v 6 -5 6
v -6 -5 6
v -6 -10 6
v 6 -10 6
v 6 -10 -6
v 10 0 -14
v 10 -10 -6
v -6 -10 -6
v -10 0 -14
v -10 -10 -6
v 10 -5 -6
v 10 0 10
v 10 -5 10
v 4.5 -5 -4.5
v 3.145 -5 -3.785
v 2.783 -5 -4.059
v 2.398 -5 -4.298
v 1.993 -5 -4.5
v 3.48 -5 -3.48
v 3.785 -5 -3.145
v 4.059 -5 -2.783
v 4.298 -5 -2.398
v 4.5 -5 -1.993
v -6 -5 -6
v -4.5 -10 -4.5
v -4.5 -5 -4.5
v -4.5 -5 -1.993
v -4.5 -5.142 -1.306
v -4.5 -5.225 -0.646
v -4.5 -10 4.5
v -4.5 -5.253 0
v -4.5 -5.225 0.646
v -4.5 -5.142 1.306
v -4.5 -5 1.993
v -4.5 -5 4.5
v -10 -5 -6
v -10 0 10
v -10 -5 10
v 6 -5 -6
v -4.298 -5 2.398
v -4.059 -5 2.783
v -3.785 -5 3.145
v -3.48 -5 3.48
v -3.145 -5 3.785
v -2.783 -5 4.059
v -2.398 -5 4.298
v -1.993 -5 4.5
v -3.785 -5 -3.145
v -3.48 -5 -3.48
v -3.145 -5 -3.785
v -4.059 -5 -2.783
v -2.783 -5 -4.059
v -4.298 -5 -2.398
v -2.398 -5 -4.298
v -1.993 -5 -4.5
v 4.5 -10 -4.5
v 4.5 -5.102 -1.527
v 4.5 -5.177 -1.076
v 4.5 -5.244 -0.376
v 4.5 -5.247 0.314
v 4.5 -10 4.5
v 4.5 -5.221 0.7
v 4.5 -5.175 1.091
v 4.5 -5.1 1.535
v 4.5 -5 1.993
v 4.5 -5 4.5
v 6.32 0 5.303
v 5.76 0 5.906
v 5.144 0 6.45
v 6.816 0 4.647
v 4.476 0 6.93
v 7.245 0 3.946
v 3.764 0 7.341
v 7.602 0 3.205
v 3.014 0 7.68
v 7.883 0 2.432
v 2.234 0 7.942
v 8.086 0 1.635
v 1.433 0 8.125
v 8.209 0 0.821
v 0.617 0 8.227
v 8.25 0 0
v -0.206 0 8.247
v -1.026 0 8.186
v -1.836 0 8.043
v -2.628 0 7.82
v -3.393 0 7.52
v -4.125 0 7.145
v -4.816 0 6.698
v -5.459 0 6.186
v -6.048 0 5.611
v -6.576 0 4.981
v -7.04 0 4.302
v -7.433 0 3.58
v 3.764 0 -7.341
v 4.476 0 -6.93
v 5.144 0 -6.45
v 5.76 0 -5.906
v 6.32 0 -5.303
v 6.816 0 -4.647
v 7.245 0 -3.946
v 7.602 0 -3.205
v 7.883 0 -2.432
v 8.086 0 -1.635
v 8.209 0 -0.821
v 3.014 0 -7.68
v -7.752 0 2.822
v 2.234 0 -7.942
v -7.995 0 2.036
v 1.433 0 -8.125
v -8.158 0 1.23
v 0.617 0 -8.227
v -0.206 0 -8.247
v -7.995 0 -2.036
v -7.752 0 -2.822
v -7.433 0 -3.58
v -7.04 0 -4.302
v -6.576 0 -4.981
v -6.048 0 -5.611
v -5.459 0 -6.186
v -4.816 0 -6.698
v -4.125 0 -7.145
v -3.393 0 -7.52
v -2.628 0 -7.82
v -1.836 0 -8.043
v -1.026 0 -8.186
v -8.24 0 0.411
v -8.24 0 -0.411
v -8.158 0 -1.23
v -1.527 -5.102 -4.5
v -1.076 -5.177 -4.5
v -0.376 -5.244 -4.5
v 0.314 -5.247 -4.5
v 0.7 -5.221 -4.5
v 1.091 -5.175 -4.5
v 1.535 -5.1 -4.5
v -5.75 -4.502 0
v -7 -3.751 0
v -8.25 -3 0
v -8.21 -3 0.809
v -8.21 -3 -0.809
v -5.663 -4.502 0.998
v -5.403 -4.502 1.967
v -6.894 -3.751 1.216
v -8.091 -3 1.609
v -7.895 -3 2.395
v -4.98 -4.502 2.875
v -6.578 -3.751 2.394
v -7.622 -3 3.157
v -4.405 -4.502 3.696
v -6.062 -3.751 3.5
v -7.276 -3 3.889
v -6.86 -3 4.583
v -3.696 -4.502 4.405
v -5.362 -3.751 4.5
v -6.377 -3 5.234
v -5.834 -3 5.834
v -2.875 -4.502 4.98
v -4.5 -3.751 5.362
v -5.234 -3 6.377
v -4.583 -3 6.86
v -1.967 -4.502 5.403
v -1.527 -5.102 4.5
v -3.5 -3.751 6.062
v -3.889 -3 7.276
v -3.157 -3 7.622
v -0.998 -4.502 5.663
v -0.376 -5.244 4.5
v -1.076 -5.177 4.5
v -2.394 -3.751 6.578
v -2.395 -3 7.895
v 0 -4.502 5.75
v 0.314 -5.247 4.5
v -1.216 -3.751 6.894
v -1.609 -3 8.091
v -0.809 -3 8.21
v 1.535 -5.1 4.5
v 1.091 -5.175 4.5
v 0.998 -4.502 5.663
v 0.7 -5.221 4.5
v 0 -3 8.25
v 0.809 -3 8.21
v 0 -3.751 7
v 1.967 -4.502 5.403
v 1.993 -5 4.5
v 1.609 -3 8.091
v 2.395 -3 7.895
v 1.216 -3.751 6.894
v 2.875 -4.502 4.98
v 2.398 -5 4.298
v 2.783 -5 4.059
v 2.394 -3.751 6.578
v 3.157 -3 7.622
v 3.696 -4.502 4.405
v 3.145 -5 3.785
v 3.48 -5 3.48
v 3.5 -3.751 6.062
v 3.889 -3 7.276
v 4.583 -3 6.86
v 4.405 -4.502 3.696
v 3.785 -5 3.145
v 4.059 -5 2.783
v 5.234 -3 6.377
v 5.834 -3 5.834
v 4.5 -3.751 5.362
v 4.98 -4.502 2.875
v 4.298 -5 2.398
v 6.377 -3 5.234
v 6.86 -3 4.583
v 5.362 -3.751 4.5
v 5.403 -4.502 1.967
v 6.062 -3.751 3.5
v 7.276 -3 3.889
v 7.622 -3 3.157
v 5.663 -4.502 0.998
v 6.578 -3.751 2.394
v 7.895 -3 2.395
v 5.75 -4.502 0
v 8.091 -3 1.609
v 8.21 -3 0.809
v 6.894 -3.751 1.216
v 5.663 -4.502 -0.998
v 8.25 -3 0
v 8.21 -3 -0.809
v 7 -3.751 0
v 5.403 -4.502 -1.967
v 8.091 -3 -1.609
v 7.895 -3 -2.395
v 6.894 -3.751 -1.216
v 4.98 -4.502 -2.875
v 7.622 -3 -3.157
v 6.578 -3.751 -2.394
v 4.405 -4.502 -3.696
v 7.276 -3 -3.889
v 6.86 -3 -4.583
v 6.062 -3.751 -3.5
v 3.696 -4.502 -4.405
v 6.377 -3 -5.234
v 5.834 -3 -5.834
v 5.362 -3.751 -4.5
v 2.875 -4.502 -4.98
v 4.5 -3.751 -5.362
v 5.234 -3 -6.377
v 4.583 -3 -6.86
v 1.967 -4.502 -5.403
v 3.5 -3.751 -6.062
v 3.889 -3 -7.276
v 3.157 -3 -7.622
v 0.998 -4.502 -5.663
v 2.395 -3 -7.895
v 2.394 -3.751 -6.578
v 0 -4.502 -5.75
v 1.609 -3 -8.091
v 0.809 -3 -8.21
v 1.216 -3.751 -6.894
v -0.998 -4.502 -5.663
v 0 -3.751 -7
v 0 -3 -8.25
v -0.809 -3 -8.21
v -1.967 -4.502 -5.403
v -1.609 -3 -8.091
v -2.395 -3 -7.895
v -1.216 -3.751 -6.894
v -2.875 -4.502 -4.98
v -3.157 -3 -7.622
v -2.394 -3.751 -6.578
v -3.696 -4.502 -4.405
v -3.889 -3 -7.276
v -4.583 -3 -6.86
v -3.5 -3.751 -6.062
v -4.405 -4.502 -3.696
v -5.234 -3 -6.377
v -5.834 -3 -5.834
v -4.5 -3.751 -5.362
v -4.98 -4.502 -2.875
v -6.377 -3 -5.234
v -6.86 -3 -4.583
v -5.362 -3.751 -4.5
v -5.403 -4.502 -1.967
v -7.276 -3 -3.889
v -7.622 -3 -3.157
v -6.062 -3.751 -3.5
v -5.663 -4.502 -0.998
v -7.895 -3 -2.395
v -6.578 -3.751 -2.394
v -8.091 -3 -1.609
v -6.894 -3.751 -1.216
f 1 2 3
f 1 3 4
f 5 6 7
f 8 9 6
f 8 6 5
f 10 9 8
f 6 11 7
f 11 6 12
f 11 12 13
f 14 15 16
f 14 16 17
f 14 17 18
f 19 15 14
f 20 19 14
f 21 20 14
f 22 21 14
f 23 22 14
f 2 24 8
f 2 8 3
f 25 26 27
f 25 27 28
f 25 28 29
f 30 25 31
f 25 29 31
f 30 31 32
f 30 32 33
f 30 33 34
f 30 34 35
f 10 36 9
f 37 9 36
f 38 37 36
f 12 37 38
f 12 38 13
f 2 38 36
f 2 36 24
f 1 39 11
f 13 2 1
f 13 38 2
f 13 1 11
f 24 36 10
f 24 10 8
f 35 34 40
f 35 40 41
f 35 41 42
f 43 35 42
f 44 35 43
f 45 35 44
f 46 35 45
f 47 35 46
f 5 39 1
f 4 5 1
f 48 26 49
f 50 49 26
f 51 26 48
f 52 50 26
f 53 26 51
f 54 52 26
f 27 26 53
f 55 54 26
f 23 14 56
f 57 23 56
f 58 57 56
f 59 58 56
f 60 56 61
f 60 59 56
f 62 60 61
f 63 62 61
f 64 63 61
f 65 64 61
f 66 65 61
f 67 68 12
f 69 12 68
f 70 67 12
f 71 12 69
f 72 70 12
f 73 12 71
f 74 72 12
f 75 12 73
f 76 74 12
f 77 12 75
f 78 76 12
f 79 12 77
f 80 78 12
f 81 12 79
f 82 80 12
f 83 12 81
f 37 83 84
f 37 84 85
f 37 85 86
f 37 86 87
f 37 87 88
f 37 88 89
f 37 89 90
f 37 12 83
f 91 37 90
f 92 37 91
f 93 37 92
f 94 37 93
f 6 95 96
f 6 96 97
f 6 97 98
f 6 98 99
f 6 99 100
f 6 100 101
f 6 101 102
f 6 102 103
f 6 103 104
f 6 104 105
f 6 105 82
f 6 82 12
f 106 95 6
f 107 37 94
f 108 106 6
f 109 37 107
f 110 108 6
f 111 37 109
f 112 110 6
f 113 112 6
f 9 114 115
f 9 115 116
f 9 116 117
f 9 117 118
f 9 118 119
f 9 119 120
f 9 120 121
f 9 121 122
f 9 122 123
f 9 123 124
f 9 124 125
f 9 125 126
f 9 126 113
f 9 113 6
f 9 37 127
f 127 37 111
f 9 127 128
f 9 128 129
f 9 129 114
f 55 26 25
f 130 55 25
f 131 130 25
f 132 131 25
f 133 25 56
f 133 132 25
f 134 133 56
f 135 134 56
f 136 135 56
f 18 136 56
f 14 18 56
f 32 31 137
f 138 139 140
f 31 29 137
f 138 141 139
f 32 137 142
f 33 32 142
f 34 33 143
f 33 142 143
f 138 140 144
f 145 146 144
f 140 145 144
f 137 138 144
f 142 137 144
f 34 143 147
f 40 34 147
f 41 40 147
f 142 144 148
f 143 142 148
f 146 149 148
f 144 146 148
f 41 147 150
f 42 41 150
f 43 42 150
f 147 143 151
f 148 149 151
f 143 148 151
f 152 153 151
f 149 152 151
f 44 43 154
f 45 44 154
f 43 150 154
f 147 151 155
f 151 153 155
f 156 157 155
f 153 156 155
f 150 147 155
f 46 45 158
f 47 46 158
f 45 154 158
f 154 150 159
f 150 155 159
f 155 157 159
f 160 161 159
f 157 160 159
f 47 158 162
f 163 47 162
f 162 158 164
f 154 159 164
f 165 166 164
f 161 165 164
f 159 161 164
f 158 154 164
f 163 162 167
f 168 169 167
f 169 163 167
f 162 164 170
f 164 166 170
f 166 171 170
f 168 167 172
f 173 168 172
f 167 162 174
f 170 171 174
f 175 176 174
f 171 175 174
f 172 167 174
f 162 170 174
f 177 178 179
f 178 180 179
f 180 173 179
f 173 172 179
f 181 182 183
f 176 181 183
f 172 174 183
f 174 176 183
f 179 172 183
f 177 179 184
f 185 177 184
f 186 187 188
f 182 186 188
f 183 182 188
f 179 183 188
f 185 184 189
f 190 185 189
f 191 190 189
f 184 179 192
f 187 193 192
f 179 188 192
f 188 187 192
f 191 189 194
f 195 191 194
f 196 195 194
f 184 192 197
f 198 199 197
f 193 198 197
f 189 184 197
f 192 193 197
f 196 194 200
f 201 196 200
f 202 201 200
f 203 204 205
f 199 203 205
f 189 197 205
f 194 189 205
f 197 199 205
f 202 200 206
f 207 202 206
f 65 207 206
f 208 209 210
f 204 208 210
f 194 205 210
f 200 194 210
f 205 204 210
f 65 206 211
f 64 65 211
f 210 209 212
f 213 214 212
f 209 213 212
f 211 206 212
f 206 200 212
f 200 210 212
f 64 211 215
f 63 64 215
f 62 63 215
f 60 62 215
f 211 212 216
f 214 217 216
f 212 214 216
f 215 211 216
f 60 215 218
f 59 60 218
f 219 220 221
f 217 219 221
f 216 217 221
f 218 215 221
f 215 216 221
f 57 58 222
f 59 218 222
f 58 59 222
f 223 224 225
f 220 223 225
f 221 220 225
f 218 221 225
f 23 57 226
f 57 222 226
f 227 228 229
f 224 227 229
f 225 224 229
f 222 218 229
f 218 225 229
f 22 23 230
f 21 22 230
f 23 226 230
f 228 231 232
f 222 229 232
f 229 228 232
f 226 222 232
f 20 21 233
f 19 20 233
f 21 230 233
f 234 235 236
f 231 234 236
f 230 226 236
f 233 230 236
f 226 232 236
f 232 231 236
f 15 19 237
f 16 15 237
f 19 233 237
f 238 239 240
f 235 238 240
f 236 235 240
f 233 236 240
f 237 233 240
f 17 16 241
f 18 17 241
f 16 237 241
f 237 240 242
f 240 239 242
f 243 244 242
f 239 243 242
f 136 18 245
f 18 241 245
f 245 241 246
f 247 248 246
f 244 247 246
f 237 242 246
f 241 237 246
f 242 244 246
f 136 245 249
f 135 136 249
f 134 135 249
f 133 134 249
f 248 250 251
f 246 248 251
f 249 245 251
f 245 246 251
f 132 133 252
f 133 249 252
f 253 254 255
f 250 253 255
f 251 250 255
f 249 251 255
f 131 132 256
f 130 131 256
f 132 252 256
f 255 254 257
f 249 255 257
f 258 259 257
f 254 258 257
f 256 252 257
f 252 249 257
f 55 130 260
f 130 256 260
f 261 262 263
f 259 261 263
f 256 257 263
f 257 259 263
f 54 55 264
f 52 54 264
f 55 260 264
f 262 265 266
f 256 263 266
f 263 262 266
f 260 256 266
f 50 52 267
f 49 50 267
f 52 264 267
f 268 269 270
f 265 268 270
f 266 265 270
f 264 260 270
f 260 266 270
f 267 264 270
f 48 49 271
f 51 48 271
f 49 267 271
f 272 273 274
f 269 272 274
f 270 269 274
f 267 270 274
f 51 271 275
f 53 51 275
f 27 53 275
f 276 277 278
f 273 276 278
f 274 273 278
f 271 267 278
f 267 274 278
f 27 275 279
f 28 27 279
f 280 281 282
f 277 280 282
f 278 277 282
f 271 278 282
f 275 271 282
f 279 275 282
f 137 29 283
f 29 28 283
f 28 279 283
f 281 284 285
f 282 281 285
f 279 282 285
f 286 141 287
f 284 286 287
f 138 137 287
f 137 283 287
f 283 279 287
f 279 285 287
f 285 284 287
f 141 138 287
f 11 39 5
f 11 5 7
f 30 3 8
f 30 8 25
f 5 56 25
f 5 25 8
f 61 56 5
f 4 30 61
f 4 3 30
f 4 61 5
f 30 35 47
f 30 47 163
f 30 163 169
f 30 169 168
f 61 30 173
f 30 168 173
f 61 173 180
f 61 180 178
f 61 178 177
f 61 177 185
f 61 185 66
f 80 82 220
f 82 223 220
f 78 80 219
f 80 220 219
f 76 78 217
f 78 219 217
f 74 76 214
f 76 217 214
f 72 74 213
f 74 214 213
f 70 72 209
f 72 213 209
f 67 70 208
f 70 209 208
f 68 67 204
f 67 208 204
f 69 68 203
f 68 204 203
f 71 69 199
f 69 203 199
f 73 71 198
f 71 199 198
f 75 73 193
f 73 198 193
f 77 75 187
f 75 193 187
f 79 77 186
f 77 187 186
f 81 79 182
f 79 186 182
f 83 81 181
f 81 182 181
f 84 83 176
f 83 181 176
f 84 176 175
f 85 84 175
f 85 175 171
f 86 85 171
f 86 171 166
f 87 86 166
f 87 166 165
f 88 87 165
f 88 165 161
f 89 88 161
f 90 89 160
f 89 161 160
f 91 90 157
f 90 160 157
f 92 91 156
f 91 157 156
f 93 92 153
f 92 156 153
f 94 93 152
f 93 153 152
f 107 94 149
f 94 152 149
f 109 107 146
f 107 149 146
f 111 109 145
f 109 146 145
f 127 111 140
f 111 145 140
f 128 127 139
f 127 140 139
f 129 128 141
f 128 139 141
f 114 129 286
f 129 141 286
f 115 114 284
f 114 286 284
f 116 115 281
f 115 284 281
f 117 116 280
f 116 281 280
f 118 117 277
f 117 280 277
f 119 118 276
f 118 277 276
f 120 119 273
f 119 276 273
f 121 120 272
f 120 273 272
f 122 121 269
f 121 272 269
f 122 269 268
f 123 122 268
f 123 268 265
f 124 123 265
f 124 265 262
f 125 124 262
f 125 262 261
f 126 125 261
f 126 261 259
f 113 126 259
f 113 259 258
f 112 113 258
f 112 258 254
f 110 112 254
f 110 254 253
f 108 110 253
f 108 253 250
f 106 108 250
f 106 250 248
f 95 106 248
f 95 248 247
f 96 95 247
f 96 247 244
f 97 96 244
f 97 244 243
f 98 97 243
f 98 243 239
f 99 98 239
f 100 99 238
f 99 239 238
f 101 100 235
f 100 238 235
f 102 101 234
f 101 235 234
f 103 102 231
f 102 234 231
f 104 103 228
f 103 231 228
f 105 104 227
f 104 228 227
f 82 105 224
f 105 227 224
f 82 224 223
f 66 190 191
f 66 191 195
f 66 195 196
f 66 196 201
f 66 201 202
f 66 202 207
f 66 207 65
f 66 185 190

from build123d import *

# Parameters (mm, degrees)
F0_W      = 20
F0_H      = 20
F1_DEPTH  = 5
F2_W      = 12
F2_H      = 12
F2_W_2    = 9
F2_H_2    = 9
F3_DEPTH  = 5
F5_D      = 16.5
F5_DEPTH  = 3
F5_TIP    = 4.957100107
F6_W      = 20
F6_H      = 4
F7_DEPTH  = 5
F9_DEPTH  = 20.001
F11_DEPTH = 20


with BuildPart() as f1:
    # F0 (on Front) → F1 (new body)
    with BuildSketch(Plane.XZ):
        Rectangle(F0_W, F0_H)
    extrude(amount=F1_DEPTH)

    # F2 (on face) → F3 (join)
    with BuildSketch(Plane.XZ.offset(5)):
        Rectangle(F2_W, F2_H)
        Rectangle(F2_W_2, F2_H_2, mode=Mode.SUBTRACT)
    extrude(amount=F3_DEPTH)

    # F5
    with Locations(Plane(origin=(0, 0, 0), x_dir=(-1, 0, 0), z_dir=(0, 1, 0))):
        with Locations((0, 0)):
            Hole(F5_D / 2, depth=F5_DEPTH)
            with Locations((0, 0, -(F5_DEPTH + F5_TIP / 2))):  # 118° drill point
                Cone(0, F5_D / 2, F5_TIP, mode=Mode.SUBTRACT)

    # F6 (on face) → F7 (join)
    with BuildSketch(Plane.XZ.offset(5)):
        with Locations((0, -8)):
            Rectangle(F6_W, F6_H)
    extrude(amount=F7_DEPTH)

    # F8 (on face) → F9 (cut, through all)
    with BuildSketch(Plane(origin=(-10, 0, 0), x_dir=(0, -1, 0), z_dir=(-1, 0, 0))):
        Polygon((10, -6), (5, -10), (10, -10), align=None)
    extrude(amount=-F9_DEPTH, mode=Mode.SUBTRACT)

    # F10 (on face) → F11 (join)
    with BuildSketch(Plane(origin=(-10, 0, 0), x_dir=(0, -1, 0), z_dir=(-1, 0, 0))):
        Polygon((0, -14), (5, -10), (0, -10), align=None)
    extrude(amount=-F11_DEPTH)


solid = f1.part
